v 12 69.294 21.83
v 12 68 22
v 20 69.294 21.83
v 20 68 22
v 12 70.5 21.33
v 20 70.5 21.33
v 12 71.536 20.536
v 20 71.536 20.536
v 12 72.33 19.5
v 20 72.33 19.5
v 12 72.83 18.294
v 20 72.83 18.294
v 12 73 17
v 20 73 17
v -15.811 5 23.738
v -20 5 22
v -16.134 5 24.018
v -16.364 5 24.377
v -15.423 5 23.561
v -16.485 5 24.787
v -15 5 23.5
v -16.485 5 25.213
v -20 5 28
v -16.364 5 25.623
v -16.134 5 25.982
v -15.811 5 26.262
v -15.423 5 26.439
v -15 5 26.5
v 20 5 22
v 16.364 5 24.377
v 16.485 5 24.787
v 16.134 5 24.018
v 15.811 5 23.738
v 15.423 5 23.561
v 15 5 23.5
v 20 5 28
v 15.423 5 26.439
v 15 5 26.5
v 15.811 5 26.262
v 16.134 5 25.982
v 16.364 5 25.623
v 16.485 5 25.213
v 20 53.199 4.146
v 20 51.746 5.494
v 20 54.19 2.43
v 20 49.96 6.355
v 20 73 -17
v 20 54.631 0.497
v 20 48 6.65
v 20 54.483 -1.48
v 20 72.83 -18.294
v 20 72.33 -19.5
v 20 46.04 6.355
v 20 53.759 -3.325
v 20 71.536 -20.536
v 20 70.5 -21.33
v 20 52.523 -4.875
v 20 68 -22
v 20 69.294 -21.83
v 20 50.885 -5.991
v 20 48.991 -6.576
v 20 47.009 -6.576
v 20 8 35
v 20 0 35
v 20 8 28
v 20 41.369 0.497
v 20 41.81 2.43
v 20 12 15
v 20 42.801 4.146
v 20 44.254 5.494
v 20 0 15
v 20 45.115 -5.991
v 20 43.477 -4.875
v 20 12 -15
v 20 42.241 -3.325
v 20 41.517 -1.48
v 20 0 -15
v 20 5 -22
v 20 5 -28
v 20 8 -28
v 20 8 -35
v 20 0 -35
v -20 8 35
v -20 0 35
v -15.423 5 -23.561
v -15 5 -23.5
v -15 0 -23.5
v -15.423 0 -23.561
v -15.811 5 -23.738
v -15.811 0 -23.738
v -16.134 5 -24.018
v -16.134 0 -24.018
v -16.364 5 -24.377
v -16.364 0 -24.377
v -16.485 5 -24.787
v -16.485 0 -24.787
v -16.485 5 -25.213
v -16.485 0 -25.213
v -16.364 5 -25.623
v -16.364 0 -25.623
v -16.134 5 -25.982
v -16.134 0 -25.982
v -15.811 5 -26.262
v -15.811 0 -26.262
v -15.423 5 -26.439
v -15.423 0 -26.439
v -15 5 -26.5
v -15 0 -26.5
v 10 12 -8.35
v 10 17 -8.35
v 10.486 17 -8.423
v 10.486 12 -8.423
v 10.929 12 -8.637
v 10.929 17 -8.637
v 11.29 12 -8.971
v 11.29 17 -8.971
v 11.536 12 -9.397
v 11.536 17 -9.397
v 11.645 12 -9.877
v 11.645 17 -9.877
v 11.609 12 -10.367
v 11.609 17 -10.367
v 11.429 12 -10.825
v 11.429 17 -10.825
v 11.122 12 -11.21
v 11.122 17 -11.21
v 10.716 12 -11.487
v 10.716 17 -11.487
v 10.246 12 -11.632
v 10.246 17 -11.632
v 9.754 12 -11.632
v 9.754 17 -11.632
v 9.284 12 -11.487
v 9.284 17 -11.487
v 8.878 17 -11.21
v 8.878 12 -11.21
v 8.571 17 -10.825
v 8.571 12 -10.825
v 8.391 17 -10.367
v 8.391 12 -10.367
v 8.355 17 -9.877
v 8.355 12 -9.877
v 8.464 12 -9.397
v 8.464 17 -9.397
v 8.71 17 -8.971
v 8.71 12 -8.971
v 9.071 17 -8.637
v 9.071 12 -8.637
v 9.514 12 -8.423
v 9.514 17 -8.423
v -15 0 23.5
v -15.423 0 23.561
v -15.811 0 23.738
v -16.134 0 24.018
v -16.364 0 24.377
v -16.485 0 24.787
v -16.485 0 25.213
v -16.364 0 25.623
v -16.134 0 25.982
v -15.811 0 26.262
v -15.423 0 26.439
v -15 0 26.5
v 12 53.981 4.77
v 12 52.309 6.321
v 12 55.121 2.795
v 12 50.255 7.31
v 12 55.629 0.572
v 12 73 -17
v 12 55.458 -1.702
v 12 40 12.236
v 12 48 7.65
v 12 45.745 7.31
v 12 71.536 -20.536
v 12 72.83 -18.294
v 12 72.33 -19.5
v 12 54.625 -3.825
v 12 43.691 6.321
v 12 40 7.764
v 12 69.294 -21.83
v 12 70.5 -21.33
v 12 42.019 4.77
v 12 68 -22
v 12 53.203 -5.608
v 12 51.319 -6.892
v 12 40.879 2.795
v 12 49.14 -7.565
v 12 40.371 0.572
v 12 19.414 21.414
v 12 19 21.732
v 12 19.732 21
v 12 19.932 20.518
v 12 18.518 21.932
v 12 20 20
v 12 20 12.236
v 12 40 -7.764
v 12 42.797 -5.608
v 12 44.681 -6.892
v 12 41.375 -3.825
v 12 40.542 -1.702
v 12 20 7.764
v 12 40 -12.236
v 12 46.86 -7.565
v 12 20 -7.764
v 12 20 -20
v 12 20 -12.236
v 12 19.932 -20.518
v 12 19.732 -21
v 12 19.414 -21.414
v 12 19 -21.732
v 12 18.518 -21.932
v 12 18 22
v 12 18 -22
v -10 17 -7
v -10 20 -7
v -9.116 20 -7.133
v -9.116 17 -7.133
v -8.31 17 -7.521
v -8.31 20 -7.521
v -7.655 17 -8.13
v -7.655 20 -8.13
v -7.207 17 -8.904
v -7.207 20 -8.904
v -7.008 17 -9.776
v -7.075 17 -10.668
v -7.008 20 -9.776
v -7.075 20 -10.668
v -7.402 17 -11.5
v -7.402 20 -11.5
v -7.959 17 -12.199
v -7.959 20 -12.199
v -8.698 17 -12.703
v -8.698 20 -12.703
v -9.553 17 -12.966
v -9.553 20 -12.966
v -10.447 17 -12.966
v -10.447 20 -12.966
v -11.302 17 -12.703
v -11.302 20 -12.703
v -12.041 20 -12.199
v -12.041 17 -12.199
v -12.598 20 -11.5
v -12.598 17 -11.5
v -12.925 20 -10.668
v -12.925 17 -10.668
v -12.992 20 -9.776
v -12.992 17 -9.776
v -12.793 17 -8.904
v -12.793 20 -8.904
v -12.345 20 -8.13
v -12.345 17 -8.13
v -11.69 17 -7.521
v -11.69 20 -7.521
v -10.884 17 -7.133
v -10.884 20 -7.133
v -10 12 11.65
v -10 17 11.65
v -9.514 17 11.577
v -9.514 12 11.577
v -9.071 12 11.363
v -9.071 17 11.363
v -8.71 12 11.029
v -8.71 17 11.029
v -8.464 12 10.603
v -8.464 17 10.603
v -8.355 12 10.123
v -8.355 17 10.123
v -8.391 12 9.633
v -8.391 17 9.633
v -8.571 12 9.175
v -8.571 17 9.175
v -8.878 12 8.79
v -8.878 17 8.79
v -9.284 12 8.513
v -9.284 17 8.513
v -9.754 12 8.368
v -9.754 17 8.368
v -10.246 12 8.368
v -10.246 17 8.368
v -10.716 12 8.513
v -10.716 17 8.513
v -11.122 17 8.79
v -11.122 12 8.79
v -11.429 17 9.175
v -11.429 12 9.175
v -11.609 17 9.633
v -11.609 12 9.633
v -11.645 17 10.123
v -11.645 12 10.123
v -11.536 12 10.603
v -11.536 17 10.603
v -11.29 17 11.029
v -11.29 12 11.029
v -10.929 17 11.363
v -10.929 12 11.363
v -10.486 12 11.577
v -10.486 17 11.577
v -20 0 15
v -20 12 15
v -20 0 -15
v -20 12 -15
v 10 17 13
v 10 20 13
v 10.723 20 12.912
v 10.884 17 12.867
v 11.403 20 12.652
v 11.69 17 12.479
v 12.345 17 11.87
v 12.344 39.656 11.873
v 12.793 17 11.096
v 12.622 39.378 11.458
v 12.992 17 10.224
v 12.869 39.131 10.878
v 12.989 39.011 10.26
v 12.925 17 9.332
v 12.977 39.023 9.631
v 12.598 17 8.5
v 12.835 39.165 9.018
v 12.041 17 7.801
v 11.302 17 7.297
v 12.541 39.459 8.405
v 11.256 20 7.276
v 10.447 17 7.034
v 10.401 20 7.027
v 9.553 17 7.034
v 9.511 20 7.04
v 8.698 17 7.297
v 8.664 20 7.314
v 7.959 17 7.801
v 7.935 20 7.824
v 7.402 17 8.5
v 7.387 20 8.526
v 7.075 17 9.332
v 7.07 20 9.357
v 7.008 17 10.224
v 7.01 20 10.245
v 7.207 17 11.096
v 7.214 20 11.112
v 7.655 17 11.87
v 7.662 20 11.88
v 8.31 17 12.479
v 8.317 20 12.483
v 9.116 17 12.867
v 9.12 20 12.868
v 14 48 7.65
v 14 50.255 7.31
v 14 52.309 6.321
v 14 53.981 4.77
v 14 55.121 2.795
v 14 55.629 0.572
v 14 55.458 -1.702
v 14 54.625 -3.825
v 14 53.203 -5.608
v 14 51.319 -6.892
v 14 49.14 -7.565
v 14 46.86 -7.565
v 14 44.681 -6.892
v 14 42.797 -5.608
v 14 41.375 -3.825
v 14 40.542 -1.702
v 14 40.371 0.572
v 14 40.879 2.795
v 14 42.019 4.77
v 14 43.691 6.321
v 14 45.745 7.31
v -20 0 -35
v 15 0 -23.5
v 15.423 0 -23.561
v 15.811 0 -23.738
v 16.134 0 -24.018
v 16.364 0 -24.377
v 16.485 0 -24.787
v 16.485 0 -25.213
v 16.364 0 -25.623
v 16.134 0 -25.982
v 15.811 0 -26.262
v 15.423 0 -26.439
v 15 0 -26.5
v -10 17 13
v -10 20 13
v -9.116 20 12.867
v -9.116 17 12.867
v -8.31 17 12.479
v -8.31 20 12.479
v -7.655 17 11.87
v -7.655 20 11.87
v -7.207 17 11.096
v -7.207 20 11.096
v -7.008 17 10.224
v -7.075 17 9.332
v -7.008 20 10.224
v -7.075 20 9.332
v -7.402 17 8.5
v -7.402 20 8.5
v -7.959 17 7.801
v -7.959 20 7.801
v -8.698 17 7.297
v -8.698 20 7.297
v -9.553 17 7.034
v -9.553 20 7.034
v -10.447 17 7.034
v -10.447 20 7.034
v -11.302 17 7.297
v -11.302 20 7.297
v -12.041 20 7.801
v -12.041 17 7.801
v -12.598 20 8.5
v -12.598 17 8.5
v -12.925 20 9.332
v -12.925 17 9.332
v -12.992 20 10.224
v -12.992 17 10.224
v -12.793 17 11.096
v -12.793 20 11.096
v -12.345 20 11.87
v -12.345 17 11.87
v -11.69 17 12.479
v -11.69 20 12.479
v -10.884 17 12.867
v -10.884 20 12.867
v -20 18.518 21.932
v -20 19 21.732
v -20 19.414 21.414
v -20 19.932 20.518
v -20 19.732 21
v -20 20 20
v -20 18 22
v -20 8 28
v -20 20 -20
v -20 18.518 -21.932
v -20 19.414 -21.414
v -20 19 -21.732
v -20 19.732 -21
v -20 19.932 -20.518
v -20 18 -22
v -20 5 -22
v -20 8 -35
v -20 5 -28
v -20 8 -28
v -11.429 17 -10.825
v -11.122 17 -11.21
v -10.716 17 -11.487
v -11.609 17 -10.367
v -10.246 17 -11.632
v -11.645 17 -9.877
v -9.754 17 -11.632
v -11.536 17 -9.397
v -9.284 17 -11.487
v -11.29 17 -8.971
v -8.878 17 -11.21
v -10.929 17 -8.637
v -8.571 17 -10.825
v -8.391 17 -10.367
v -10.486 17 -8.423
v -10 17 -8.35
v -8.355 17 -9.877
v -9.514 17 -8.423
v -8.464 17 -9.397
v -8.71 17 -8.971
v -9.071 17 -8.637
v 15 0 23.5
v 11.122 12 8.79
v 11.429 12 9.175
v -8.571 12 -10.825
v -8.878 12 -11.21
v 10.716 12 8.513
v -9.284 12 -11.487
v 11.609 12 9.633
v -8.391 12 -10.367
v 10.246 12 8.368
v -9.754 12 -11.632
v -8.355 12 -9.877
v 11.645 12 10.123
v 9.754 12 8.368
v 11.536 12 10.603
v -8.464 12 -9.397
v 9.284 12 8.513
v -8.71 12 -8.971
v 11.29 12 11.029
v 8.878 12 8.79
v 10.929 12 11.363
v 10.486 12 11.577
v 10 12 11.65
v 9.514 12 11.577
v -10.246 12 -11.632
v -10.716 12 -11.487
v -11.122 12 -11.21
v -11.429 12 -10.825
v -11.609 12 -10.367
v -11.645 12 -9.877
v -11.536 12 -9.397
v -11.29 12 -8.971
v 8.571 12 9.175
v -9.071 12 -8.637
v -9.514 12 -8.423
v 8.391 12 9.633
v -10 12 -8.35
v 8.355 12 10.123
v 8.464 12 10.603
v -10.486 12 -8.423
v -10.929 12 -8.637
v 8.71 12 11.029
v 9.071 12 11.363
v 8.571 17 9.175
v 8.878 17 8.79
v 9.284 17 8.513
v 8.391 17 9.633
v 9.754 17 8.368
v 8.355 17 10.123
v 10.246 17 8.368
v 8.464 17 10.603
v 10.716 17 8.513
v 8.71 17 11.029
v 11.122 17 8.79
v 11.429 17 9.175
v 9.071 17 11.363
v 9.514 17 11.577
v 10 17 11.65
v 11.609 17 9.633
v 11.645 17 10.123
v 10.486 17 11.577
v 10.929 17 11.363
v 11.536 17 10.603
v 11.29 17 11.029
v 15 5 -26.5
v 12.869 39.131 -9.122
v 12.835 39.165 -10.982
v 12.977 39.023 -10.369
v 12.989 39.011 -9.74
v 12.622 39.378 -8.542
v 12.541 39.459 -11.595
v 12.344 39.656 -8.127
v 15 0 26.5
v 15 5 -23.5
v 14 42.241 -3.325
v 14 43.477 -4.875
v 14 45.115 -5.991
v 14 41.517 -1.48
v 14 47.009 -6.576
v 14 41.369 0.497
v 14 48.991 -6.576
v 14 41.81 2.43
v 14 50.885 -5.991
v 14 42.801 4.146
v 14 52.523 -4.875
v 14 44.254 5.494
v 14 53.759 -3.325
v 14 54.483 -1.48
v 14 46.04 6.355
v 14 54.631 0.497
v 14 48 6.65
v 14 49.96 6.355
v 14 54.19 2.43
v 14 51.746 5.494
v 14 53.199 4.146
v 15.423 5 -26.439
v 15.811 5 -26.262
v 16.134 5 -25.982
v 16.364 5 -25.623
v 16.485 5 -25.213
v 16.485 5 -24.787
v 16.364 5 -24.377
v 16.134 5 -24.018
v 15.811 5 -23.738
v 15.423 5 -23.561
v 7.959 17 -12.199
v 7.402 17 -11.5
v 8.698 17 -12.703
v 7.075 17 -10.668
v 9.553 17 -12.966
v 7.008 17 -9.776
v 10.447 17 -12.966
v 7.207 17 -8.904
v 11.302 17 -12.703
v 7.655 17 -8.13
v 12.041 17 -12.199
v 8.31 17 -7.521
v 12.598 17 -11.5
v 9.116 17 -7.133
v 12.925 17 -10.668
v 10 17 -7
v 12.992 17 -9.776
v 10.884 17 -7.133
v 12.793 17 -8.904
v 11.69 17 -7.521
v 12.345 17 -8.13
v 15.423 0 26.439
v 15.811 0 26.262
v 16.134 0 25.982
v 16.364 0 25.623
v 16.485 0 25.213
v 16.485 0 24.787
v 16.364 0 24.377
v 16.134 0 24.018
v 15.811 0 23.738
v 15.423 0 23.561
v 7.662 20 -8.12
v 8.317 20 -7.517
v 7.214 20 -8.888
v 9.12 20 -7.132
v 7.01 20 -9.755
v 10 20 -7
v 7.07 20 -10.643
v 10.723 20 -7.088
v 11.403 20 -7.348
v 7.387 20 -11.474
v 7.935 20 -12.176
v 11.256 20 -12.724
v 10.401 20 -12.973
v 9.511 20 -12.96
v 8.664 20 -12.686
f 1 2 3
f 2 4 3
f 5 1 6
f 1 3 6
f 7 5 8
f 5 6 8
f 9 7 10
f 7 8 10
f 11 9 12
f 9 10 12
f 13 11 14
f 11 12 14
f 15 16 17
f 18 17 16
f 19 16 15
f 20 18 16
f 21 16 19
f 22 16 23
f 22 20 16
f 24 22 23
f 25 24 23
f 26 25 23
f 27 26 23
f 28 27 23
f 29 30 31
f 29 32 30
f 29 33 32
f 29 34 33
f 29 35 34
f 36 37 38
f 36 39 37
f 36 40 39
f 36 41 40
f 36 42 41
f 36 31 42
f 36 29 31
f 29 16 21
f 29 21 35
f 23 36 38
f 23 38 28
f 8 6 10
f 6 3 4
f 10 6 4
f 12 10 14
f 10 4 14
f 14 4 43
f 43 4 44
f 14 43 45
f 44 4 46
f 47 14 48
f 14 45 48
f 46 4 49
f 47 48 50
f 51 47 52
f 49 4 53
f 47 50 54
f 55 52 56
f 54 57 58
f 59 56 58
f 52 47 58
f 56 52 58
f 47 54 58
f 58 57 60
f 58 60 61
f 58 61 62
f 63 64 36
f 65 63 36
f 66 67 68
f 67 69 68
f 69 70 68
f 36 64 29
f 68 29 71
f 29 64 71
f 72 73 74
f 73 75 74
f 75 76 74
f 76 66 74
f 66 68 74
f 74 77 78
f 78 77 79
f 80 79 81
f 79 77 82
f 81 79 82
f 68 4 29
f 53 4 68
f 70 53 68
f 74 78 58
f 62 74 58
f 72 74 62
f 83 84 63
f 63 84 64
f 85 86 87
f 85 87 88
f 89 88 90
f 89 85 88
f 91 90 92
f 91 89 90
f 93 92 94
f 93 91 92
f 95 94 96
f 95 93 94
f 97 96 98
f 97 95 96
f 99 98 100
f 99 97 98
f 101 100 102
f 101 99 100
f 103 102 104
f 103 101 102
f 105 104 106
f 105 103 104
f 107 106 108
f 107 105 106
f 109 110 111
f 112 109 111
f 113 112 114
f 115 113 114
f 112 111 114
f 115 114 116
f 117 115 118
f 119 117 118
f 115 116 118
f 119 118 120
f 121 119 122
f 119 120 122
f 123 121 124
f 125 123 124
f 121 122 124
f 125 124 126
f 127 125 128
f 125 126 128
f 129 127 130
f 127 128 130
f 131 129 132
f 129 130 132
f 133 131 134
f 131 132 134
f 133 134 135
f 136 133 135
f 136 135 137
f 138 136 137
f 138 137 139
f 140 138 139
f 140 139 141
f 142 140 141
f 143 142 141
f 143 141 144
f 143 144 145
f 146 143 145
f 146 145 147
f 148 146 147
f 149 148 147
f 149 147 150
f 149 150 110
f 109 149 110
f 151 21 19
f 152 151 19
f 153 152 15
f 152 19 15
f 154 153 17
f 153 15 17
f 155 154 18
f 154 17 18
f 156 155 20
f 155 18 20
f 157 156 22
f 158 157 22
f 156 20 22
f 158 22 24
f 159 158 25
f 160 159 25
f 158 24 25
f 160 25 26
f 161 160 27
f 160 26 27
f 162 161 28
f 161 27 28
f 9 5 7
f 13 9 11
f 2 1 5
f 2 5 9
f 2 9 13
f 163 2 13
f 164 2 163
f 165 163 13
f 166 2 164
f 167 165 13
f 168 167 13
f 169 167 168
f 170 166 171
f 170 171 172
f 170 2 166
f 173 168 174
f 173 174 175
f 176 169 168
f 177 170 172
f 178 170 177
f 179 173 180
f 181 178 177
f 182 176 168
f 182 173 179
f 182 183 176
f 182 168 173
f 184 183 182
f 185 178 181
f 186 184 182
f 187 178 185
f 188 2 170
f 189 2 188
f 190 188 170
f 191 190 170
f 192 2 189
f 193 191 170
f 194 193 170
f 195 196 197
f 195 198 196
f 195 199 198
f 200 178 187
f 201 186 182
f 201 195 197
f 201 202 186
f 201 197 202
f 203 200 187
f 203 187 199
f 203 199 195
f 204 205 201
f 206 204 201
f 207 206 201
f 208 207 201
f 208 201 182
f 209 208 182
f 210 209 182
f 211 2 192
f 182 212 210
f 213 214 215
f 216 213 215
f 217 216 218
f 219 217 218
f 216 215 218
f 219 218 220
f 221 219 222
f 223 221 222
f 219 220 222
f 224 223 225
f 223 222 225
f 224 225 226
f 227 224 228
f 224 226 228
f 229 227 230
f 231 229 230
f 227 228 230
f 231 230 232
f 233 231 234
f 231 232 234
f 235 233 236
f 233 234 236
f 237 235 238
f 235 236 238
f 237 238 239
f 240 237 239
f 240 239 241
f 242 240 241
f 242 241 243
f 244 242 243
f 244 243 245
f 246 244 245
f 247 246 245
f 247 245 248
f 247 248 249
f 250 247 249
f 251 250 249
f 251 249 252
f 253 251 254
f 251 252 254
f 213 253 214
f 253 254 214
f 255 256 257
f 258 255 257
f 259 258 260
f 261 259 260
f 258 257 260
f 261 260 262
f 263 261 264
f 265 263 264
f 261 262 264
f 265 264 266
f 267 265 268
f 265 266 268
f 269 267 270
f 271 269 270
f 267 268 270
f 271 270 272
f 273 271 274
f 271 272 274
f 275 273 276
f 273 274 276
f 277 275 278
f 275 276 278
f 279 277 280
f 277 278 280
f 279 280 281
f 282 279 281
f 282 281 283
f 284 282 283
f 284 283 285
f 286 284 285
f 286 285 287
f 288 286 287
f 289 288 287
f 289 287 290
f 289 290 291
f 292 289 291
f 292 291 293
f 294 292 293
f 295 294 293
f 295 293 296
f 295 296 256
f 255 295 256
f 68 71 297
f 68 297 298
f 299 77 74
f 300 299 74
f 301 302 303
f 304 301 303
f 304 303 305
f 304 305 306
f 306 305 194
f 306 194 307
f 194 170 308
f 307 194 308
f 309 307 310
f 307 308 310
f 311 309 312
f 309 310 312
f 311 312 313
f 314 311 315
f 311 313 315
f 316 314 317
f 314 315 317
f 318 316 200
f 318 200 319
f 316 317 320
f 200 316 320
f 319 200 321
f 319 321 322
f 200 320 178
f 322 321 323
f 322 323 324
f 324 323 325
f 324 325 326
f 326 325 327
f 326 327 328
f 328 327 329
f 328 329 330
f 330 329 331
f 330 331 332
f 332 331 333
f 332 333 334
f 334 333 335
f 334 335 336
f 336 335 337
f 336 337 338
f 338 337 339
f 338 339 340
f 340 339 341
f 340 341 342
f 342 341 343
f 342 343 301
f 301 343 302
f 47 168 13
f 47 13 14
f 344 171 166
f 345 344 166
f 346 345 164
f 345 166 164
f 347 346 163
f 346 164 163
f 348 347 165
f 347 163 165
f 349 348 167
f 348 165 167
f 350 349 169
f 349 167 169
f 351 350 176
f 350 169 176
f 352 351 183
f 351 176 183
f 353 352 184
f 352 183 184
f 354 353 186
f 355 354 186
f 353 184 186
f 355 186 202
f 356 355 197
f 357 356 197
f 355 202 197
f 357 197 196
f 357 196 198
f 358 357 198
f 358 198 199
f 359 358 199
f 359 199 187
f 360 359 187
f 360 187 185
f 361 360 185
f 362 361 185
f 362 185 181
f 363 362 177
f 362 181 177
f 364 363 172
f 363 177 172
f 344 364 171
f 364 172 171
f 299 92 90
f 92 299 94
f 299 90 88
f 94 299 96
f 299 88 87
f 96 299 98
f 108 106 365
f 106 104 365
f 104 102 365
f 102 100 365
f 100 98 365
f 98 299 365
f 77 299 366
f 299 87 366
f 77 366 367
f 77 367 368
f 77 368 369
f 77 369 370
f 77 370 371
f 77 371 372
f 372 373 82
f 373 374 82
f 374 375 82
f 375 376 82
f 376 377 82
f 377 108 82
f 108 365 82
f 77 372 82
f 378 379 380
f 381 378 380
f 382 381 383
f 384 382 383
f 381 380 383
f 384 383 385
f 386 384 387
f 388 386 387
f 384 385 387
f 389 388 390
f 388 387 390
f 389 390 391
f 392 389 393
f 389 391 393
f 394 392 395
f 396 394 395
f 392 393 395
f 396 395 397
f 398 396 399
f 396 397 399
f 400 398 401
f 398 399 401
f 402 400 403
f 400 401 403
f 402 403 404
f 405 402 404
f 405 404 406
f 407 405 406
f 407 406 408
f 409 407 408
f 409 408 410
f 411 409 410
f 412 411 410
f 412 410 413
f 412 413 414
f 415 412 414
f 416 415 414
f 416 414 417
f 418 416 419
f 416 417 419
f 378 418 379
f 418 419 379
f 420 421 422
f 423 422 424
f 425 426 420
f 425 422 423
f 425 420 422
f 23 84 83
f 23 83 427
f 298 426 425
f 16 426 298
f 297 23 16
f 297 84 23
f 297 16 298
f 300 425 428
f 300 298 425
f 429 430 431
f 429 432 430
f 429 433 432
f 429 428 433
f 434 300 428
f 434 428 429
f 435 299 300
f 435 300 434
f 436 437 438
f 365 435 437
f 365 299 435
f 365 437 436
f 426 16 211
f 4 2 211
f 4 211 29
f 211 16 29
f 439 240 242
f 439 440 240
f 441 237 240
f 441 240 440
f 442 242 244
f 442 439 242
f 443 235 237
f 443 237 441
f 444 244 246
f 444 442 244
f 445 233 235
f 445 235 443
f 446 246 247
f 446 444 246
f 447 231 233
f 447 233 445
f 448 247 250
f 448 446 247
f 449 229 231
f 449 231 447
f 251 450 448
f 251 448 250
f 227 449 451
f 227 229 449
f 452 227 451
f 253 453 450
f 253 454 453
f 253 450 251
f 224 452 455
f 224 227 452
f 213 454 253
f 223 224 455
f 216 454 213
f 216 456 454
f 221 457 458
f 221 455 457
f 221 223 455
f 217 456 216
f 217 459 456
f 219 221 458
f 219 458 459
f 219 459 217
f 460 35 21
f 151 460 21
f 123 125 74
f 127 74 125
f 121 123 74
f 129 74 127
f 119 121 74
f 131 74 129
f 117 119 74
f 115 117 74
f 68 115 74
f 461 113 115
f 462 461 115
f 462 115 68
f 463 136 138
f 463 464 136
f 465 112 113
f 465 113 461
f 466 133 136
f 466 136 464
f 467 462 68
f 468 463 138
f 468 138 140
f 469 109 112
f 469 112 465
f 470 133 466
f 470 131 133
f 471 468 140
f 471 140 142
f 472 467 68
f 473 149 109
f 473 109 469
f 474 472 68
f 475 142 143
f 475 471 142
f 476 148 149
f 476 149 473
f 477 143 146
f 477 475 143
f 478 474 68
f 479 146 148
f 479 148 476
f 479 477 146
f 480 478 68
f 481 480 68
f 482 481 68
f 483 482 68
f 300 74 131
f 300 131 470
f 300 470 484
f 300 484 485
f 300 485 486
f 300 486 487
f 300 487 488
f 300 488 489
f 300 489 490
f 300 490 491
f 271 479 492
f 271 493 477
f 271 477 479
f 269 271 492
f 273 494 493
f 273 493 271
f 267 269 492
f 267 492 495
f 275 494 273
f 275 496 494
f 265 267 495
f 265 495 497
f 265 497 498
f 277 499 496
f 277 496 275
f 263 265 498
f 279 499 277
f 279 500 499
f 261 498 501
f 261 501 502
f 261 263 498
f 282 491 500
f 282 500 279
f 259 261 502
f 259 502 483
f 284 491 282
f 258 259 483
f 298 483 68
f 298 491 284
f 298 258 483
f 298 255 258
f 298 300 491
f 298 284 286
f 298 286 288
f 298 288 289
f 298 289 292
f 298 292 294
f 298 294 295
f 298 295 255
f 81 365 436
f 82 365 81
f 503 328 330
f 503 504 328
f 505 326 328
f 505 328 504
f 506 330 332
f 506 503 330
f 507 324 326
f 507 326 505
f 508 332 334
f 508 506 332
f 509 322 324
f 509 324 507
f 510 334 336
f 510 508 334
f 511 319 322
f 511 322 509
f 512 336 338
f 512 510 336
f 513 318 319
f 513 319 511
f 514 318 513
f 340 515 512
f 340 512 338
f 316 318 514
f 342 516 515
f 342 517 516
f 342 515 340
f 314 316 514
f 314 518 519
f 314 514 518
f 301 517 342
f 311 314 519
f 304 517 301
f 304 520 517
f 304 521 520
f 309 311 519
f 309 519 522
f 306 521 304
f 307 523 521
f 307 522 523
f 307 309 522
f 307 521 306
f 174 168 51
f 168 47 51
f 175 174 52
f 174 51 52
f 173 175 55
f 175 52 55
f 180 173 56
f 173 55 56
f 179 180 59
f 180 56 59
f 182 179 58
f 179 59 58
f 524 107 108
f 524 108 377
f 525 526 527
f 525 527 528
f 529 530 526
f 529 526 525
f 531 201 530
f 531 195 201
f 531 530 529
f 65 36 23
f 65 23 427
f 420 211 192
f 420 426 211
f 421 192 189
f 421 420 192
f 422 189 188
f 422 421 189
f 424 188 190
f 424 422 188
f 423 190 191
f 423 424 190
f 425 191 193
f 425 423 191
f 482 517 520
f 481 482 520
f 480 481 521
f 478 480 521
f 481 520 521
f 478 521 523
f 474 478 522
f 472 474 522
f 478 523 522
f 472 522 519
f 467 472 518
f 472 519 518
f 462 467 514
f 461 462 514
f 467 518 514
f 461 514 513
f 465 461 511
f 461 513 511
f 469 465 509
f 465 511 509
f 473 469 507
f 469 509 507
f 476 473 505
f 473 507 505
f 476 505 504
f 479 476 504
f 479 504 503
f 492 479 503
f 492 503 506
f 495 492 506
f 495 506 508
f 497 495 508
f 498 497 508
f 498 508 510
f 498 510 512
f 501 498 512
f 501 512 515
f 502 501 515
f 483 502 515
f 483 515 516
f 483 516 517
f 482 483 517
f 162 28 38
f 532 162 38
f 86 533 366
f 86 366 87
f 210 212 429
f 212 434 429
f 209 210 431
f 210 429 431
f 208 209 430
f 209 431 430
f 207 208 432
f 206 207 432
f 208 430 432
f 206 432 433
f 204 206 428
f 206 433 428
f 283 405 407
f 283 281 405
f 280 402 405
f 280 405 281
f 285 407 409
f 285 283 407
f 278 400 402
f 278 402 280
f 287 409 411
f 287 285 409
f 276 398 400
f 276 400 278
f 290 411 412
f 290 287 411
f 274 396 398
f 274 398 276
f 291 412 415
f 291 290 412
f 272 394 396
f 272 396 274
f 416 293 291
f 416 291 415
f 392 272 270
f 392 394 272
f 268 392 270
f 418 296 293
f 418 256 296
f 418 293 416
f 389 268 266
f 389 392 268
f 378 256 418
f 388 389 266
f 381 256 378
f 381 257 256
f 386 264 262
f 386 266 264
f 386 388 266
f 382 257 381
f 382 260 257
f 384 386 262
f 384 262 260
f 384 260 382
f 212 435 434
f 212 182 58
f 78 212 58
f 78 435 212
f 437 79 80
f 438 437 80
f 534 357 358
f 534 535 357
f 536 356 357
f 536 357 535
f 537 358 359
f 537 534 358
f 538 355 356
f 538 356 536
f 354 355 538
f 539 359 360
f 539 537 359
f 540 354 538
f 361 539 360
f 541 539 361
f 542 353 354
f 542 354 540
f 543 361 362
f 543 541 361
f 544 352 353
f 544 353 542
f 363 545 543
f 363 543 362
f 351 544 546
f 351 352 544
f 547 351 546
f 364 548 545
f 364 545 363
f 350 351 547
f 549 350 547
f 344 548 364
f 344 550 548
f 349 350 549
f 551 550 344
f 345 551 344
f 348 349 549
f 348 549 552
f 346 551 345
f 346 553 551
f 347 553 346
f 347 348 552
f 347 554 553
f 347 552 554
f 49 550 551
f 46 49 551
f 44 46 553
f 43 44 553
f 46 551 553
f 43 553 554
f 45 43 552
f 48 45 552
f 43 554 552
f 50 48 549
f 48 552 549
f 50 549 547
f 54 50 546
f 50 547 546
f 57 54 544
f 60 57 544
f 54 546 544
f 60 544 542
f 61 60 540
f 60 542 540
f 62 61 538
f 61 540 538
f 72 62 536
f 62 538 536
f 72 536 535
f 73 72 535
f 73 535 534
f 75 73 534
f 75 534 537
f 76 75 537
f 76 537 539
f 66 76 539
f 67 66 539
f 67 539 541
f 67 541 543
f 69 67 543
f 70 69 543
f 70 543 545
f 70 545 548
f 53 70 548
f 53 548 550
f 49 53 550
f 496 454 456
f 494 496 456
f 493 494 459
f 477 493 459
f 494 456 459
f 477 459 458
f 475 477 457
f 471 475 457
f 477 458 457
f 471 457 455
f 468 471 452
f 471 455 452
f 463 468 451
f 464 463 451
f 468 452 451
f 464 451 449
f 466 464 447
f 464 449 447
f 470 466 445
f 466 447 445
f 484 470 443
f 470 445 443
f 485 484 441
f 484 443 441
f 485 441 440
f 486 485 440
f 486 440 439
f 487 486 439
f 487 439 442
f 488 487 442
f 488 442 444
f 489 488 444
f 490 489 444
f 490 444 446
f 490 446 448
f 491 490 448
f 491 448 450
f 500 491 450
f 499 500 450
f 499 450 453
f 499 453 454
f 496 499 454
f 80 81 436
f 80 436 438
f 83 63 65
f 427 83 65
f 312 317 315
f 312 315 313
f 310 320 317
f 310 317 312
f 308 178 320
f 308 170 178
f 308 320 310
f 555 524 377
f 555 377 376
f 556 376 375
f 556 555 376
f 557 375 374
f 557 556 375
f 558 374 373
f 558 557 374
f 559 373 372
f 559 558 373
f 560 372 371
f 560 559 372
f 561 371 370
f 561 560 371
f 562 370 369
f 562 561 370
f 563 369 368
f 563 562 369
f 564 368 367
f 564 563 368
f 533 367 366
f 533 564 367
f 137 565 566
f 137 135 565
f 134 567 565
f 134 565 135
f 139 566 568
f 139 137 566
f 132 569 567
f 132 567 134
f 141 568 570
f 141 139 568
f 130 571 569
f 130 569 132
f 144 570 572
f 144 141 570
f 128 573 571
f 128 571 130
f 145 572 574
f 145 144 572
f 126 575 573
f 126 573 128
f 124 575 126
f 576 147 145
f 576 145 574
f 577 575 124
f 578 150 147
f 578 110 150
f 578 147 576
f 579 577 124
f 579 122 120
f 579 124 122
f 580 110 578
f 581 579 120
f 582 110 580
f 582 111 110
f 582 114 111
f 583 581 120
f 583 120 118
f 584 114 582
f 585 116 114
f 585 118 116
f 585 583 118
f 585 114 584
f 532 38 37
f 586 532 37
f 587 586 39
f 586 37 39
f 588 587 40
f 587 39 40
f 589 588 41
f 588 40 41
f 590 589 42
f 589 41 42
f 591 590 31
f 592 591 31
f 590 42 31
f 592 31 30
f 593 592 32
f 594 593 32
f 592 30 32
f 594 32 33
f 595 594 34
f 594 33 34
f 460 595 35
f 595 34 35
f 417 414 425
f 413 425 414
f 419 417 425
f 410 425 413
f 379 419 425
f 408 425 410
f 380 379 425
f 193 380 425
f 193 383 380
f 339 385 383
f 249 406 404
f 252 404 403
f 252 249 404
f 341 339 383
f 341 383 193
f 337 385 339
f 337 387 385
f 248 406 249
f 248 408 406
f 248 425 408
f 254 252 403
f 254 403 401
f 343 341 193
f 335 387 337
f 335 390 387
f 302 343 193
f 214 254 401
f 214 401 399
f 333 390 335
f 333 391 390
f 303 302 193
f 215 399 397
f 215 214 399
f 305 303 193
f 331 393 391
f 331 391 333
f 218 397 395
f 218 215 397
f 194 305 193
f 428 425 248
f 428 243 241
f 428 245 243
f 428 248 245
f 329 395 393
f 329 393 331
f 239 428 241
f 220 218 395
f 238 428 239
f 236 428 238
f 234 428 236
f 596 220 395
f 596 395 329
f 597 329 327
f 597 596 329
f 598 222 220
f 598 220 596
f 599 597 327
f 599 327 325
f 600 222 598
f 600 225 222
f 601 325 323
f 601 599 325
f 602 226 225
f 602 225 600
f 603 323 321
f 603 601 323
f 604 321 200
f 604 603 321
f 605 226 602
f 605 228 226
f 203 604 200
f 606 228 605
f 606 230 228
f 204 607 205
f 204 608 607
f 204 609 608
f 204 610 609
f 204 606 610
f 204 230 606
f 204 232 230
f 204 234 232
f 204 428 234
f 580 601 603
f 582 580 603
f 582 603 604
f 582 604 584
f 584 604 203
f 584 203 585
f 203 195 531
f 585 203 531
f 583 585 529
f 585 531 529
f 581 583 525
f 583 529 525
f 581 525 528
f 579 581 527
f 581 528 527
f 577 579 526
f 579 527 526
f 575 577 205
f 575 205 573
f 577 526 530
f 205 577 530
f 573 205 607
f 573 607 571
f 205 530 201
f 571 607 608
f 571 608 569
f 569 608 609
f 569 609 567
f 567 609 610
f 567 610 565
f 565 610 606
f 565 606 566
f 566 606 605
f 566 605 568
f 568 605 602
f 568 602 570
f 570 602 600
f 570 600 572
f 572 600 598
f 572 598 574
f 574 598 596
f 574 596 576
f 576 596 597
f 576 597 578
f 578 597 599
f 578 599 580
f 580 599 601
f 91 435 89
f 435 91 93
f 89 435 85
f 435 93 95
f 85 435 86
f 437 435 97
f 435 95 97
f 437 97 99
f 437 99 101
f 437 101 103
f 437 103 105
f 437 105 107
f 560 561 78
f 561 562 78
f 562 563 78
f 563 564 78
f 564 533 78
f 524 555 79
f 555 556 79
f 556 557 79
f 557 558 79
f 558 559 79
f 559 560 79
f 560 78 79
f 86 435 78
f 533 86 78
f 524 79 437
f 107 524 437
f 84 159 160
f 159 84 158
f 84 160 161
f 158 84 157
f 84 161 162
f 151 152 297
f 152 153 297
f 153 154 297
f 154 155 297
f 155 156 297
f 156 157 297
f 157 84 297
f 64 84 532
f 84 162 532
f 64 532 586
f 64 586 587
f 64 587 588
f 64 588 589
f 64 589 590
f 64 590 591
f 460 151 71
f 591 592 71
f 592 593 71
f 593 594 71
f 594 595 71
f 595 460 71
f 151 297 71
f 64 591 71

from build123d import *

# Parameters (mm, degrees)
SKETCH1_W           = 40
SKETCH1_H           = 70
BOSS_EXTRUDE1_DEPTH = 20
SKETCH2_W           = 30
SKETCH2_H           = 24
CUT_EXTRUDE1_DEPTH  = 57.789083458
SKETCH3_R           = 1.65
CUT_EXTRUDE2_DEPTH  = 46
SKETCH5_R           = 3
CUT_EXTRUDE3_DEPTH  = 3
SKETCH9_W           = 6
SKETCH9_H           = 30
CUT_EXTRUDE6_DEPTH  = 57.789083458
CUT_EXTRUDE7_DEPTH  = 10
SKETCH14_W          = 8
SKETCH14_H          = 44
BOSS_EXTRUDE3_DEPTH = 53
SKETCH16_R          = 6.65
CUT_EXTRUDE11_DEPTH = 88.051708771
SKETCH17_R          = 7.65
CUT_EXTRUDE12_DEPTH = 2
FILLET2_R           = 5
SKETCH18_R          = 3
CUT_EXTRUDE13_DEPTH = 18
CHAMFER1_SIZE       = 2
SKETCH19_W          = 7
SKETCH19_H          = 12
CUT_EXTRUDE14_DEPTH = 91.29950166
FILLET4_R           = 2


with BuildPart() as part:
    # Sketch1 → Boss-Extrude1 (new body)
    with BuildSketch(Plane(origin=(0, 0, 0), x_dir=(1, 0, 0), z_dir=(0, 1, 0))):
        Rectangle(SKETCH1_W, SKETCH1_H)
    extrude(amount=BOSS_EXTRUDE1_DEPTH)

    # Sketch2 → Cut-Extrude1 (cut, through all)
    with BuildSketch(Plane.ZY.offset(20)):
        Rectangle(SKETCH2_W, SKETCH2_H)
    extrude(amount=-CUT_EXTRUDE1_DEPTH, mode=Mode.SUBTRACT)

    # Sketch3 → Cut-Extrude2 (cut, through all)
    with BuildSketch(Plane(origin=(0, 20, 0), x_dir=(1, 0, 0), z_dir=(0, 1, 0))):
        with Locations(Location((-10, 10, 0), (0, 0, 270))):
            Circle(SKETCH3_R)
        with Locations(Location((10, 10, 0), (0, 0, 270))):
            Circle(SKETCH3_R)
        with Locations(Location((10, -10, 0), (0, 0, 270))):
            Circle(SKETCH3_R)
        with Locations(Location((-10, -10, 0), (0, 0, 270))):
            Circle(SKETCH3_R)
    extrude(amount=-CUT_EXTRUDE2_DEPTH, mode=Mode.SUBTRACT)

    # Sketch5 → Cut-Extrude3 (cut)
    with BuildSketch(Plane(origin=(0, 20, 0), x_dir=(1, 0, 0), z_dir=(0, 1, 0))):
        with Locations(Location((-10, 10, 0), (0, 0, 270))):
            Circle(SKETCH5_R)
        with Locations(Location((10, 10, 0), (0, 0, 270))):
            Circle(SKETCH5_R)
        with Locations(Location((10, -10, 0), (0, 0, 270))):
            Circle(SKETCH5_R)
        with Locations(Location((-10, -10, 0), (0, 0, 270))):
            Circle(SKETCH5_R)
    extrude(amount=-CUT_EXTRUDE3_DEPTH, mode=Mode.SUBTRACT)

    # Sketch9 → Cut-Extrude6 (cut, through all)
    with BuildSketch(Plane(origin=(20, 0, 0), x_dir=(0, 0, -1), z_dir=(1, 0, 0))):
        with Locations((25, 20)):
            Rectangle(SKETCH9_W, SKETCH9_H)
    cut_extrude6 = extrude(amount=-CUT_EXTRUDE6_DEPTH, mode=Mode.SUBTRACT)

    # Sketch10 → Cut-Extrude7 (cut)
    with BuildSketch(Plane(origin=(0, 5, 0), x_dir=(1, 0, 0), z_dir=(0, 1, 0))):
        with BuildLine():
            Line((15, 23.5), (-15, 23.5))
            ThreePointArc((-15, 23.5), (-16.5, 25), (-15, 26.5))
            Line((-15, 26.5), (15, 26.5))
            ThreePointArc((15, 26.5), (16.5, 25), (15, 23.5))
        make_face()
    cut_extrude7 = extrude(amount=-CUT_EXTRUDE7_DEPTH, mode=Mode.SUBTRACT)

    # Mirror2: Cut-Extrude6, Cut-Extrude7 across plane
    add(cut_extrude6.mirror(Plane.XY), mode=Mode.SUBTRACT)
    add(cut_extrude7.mirror(Plane.XY), mode=Mode.SUBTRACT)

    # Sketch14 → Boss-Extrude3 (add)
    with BuildSketch(Plane(origin=(0, 20, 0), x_dir=(1, 0, 0), z_dir=(0, 1, 0))):
        with Locations((16, 0)):
            Rectangle(SKETCH14_W, SKETCH14_H)
    extrude(amount=BOSS_EXTRUDE3_DEPTH)

    # Sketch16 → Cut-Extrude11 (cut, through all)
    with BuildSketch(Plane.ZY.offset(-12)):
        with Locations((0, 48)):
            Circle(SKETCH16_R)
    extrude(amount=-CUT_EXTRUDE11_DEPTH, mode=Mode.SUBTRACT)

    # Sketch17 → Cut-Extrude12 (cut)
    with BuildSketch(Plane.ZY.offset(-12)):
        with Locations((0, 48)):
            Circle(SKETCH17_R)
    extrude(amount=-CUT_EXTRUDE12_DEPTH, mode=Mode.SUBTRACT)

    # Fillet2
    fillet2_edges = [part.edges().sort_by_distance(p)[0] for p in [
        (16, 73, -22),
        (16, 73, 22),
    ]]
    fillet(fillet2_edges, radius=FILLET2_R)

    # Sketch18 → Cut-Extrude13 (cut)
    with BuildSketch(Plane(origin=(0, 38, 0), x_dir=(1, 0, 0), z_dir=(0, 1, 0))):
        with Locations(Location((10, 10, 0), (0, 0, 270))):
            Circle(SKETCH18_R)
        with Locations(Location((10, -10, 0), (0, 0, 270))):
            Circle(SKETCH18_R)
    extrude(amount=-CUT_EXTRUDE13_DEPTH, mode=Mode.SUBTRACT)

    # Chamfer1
    # the kernel refuses this chamfer: 2 mm, written as the material it takes off along each edge
    with BuildSketch(Plane(origin=(12, 38, 17.379433953), x_dir=(-0.02749587661058651, 0.9996219169112968, 0), z_dir=(0, 0, -1))) as chamfer1_piece_1_section:
        Polygon((CHAMFER1_SIZE * 0.999621916911, CHAMFER1_SIZE * 0.0274958766106), (-CHAMFER1_SIZE * 0.0274958766106, CHAMFER1_SIZE * 0.999621916911), (0, 0), align=None)
    chamfer1_piece_1 = extrude(amount=14.758867907, mode=Mode.PRIVATE)
    chamfer1_piece_1 = chamfer1_piece_1 & Plane(origin=(10, 38.83392746, 10), x_dir=(0, 0, 1), z_dir=(0, 1, 0)) * Cylinder(3, 38, mode=Mode.PRIVATE)
    add(chamfer1_piece_1, mode=Mode.SUBTRACT)
    with BuildSketch(Plane(origin=(12, 38, -2.620566047), x_dir=(-0.02749587661058651, 0.9996219169112968, 0), z_dir=(0, 0, -1))) as chamfer1_piece_2_section:
        Polygon((CHAMFER1_SIZE * 0.999621916911, CHAMFER1_SIZE * 0.0274958766106), (-CHAMFER1_SIZE * 0.0274958766106, CHAMFER1_SIZE * 0.999621916911), (0, 0), align=None)
    chamfer1_piece_2 = extrude(amount=14.758867907, mode=Mode.PRIVATE)
    chamfer1_piece_2 = chamfer1_piece_2 & Plane(origin=(10, 38.833927472, -10), x_dir=(0, 0, 1), z_dir=(0, 1, 0)) * Cylinder(3, 38, mode=Mode.PRIVATE)
    add(chamfer1_piece_2, mode=Mode.SUBTRACT)

    # Sketch19 → Cut-Extrude14 (cut, through all)
    with BuildSketch(Plane(origin=(20, 0, 0), x_dir=(0, 0, -1), z_dir=(1, 0, 0))):
        with Locations((-31.5, 14)):
            Rectangle(SKETCH19_W, SKETCH19_H)
    cut_extrude14 = extrude(amount=-CUT_EXTRUDE14_DEPTH, mode=Mode.SUBTRACT)

    # Mirror3: Cut-Extrude14 across plane
    add(cut_extrude14.mirror(Plane.XY), mode=Mode.SUBTRACT)

    # Fillet4
    fillet4_edges = [part.edges().sort_by_distance(p)[0] for p in [
        (-4, 20, 22),
        (-4, 20, -22),
    ]]
    fillet(fillet4_edges, radius=FILLET4_R)


solid = part.part
